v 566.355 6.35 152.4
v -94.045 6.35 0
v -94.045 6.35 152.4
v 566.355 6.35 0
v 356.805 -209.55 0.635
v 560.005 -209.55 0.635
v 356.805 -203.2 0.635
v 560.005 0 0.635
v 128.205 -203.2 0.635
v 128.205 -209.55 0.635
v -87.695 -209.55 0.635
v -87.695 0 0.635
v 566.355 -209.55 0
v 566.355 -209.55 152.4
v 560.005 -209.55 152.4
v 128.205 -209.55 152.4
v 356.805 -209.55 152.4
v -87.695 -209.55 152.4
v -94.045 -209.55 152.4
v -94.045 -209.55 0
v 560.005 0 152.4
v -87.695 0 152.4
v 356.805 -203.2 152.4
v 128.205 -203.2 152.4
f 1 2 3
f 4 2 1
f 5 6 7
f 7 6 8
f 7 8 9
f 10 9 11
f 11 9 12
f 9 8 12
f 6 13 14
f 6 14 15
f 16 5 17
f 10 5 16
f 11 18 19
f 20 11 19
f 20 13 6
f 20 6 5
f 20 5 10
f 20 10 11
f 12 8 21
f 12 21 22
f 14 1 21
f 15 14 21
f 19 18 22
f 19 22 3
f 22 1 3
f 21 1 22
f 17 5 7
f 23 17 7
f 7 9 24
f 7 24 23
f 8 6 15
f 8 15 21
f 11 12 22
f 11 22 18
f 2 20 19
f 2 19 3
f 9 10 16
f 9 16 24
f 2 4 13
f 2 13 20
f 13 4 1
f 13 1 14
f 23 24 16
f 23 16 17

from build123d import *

# Parameters (mm, degrees)
BOSS_EXTRUDE1_DEPTH   = 152.4
SKETCH1_W             = 228.6
SKETCH1_H             = 6.35
BOSS_EXTRUDE1_2_DEPTH = 152.4
SKETCH3_W             = 647.7
SKETCH3_H             = 209.55
BOSS_EXTRUDE2_DEPTH   = 0.635


with BuildPart() as part:
    # Sketch1 → Boss-Extrude1 (new body)
    with BuildSketch(Plane.XY):
        Polygon((-94.045128316, 6.35), (566.354871684, 6.35), (566.354871684, -209.55), (560.004871684, -209.55), (560.004871684, 0), (-87.695128316, 0), (-87.695128316, -209.55), (-94.045128316, -209.55), align=None)
    extrude(amount=BOSS_EXTRUDE1_DEPTH)



with BuildPart() as body_2:
    # Sketch1 → Boss-Extrude1 2 (new body)
    with BuildSketch(Plane.XY):
        with Locations((242.504871684, -206.375)):
            Rectangle(SKETCH1_W, SKETCH1_H)
    extrude(amount=BOSS_EXTRUDE1_2_DEPTH)


with BuildPart() as part_1:
    add(part.part)

    add(body_2.part)  # Boss-Extrude2 merges body 2
    # Sketch3 → Boss-Extrude2 (add)
    with BuildSketch(Plane(origin=(0, 0, 0), x_dir=(-1, 0, 0), z_dir=(0, 0, -1))):
        with Locations((-236.154871684, -104.775)):
            Rectangle(SKETCH3_W, SKETCH3_H)
    extrude(amount=-BOSS_EXTRUDE2_DEPTH)


solid = part_1.part
